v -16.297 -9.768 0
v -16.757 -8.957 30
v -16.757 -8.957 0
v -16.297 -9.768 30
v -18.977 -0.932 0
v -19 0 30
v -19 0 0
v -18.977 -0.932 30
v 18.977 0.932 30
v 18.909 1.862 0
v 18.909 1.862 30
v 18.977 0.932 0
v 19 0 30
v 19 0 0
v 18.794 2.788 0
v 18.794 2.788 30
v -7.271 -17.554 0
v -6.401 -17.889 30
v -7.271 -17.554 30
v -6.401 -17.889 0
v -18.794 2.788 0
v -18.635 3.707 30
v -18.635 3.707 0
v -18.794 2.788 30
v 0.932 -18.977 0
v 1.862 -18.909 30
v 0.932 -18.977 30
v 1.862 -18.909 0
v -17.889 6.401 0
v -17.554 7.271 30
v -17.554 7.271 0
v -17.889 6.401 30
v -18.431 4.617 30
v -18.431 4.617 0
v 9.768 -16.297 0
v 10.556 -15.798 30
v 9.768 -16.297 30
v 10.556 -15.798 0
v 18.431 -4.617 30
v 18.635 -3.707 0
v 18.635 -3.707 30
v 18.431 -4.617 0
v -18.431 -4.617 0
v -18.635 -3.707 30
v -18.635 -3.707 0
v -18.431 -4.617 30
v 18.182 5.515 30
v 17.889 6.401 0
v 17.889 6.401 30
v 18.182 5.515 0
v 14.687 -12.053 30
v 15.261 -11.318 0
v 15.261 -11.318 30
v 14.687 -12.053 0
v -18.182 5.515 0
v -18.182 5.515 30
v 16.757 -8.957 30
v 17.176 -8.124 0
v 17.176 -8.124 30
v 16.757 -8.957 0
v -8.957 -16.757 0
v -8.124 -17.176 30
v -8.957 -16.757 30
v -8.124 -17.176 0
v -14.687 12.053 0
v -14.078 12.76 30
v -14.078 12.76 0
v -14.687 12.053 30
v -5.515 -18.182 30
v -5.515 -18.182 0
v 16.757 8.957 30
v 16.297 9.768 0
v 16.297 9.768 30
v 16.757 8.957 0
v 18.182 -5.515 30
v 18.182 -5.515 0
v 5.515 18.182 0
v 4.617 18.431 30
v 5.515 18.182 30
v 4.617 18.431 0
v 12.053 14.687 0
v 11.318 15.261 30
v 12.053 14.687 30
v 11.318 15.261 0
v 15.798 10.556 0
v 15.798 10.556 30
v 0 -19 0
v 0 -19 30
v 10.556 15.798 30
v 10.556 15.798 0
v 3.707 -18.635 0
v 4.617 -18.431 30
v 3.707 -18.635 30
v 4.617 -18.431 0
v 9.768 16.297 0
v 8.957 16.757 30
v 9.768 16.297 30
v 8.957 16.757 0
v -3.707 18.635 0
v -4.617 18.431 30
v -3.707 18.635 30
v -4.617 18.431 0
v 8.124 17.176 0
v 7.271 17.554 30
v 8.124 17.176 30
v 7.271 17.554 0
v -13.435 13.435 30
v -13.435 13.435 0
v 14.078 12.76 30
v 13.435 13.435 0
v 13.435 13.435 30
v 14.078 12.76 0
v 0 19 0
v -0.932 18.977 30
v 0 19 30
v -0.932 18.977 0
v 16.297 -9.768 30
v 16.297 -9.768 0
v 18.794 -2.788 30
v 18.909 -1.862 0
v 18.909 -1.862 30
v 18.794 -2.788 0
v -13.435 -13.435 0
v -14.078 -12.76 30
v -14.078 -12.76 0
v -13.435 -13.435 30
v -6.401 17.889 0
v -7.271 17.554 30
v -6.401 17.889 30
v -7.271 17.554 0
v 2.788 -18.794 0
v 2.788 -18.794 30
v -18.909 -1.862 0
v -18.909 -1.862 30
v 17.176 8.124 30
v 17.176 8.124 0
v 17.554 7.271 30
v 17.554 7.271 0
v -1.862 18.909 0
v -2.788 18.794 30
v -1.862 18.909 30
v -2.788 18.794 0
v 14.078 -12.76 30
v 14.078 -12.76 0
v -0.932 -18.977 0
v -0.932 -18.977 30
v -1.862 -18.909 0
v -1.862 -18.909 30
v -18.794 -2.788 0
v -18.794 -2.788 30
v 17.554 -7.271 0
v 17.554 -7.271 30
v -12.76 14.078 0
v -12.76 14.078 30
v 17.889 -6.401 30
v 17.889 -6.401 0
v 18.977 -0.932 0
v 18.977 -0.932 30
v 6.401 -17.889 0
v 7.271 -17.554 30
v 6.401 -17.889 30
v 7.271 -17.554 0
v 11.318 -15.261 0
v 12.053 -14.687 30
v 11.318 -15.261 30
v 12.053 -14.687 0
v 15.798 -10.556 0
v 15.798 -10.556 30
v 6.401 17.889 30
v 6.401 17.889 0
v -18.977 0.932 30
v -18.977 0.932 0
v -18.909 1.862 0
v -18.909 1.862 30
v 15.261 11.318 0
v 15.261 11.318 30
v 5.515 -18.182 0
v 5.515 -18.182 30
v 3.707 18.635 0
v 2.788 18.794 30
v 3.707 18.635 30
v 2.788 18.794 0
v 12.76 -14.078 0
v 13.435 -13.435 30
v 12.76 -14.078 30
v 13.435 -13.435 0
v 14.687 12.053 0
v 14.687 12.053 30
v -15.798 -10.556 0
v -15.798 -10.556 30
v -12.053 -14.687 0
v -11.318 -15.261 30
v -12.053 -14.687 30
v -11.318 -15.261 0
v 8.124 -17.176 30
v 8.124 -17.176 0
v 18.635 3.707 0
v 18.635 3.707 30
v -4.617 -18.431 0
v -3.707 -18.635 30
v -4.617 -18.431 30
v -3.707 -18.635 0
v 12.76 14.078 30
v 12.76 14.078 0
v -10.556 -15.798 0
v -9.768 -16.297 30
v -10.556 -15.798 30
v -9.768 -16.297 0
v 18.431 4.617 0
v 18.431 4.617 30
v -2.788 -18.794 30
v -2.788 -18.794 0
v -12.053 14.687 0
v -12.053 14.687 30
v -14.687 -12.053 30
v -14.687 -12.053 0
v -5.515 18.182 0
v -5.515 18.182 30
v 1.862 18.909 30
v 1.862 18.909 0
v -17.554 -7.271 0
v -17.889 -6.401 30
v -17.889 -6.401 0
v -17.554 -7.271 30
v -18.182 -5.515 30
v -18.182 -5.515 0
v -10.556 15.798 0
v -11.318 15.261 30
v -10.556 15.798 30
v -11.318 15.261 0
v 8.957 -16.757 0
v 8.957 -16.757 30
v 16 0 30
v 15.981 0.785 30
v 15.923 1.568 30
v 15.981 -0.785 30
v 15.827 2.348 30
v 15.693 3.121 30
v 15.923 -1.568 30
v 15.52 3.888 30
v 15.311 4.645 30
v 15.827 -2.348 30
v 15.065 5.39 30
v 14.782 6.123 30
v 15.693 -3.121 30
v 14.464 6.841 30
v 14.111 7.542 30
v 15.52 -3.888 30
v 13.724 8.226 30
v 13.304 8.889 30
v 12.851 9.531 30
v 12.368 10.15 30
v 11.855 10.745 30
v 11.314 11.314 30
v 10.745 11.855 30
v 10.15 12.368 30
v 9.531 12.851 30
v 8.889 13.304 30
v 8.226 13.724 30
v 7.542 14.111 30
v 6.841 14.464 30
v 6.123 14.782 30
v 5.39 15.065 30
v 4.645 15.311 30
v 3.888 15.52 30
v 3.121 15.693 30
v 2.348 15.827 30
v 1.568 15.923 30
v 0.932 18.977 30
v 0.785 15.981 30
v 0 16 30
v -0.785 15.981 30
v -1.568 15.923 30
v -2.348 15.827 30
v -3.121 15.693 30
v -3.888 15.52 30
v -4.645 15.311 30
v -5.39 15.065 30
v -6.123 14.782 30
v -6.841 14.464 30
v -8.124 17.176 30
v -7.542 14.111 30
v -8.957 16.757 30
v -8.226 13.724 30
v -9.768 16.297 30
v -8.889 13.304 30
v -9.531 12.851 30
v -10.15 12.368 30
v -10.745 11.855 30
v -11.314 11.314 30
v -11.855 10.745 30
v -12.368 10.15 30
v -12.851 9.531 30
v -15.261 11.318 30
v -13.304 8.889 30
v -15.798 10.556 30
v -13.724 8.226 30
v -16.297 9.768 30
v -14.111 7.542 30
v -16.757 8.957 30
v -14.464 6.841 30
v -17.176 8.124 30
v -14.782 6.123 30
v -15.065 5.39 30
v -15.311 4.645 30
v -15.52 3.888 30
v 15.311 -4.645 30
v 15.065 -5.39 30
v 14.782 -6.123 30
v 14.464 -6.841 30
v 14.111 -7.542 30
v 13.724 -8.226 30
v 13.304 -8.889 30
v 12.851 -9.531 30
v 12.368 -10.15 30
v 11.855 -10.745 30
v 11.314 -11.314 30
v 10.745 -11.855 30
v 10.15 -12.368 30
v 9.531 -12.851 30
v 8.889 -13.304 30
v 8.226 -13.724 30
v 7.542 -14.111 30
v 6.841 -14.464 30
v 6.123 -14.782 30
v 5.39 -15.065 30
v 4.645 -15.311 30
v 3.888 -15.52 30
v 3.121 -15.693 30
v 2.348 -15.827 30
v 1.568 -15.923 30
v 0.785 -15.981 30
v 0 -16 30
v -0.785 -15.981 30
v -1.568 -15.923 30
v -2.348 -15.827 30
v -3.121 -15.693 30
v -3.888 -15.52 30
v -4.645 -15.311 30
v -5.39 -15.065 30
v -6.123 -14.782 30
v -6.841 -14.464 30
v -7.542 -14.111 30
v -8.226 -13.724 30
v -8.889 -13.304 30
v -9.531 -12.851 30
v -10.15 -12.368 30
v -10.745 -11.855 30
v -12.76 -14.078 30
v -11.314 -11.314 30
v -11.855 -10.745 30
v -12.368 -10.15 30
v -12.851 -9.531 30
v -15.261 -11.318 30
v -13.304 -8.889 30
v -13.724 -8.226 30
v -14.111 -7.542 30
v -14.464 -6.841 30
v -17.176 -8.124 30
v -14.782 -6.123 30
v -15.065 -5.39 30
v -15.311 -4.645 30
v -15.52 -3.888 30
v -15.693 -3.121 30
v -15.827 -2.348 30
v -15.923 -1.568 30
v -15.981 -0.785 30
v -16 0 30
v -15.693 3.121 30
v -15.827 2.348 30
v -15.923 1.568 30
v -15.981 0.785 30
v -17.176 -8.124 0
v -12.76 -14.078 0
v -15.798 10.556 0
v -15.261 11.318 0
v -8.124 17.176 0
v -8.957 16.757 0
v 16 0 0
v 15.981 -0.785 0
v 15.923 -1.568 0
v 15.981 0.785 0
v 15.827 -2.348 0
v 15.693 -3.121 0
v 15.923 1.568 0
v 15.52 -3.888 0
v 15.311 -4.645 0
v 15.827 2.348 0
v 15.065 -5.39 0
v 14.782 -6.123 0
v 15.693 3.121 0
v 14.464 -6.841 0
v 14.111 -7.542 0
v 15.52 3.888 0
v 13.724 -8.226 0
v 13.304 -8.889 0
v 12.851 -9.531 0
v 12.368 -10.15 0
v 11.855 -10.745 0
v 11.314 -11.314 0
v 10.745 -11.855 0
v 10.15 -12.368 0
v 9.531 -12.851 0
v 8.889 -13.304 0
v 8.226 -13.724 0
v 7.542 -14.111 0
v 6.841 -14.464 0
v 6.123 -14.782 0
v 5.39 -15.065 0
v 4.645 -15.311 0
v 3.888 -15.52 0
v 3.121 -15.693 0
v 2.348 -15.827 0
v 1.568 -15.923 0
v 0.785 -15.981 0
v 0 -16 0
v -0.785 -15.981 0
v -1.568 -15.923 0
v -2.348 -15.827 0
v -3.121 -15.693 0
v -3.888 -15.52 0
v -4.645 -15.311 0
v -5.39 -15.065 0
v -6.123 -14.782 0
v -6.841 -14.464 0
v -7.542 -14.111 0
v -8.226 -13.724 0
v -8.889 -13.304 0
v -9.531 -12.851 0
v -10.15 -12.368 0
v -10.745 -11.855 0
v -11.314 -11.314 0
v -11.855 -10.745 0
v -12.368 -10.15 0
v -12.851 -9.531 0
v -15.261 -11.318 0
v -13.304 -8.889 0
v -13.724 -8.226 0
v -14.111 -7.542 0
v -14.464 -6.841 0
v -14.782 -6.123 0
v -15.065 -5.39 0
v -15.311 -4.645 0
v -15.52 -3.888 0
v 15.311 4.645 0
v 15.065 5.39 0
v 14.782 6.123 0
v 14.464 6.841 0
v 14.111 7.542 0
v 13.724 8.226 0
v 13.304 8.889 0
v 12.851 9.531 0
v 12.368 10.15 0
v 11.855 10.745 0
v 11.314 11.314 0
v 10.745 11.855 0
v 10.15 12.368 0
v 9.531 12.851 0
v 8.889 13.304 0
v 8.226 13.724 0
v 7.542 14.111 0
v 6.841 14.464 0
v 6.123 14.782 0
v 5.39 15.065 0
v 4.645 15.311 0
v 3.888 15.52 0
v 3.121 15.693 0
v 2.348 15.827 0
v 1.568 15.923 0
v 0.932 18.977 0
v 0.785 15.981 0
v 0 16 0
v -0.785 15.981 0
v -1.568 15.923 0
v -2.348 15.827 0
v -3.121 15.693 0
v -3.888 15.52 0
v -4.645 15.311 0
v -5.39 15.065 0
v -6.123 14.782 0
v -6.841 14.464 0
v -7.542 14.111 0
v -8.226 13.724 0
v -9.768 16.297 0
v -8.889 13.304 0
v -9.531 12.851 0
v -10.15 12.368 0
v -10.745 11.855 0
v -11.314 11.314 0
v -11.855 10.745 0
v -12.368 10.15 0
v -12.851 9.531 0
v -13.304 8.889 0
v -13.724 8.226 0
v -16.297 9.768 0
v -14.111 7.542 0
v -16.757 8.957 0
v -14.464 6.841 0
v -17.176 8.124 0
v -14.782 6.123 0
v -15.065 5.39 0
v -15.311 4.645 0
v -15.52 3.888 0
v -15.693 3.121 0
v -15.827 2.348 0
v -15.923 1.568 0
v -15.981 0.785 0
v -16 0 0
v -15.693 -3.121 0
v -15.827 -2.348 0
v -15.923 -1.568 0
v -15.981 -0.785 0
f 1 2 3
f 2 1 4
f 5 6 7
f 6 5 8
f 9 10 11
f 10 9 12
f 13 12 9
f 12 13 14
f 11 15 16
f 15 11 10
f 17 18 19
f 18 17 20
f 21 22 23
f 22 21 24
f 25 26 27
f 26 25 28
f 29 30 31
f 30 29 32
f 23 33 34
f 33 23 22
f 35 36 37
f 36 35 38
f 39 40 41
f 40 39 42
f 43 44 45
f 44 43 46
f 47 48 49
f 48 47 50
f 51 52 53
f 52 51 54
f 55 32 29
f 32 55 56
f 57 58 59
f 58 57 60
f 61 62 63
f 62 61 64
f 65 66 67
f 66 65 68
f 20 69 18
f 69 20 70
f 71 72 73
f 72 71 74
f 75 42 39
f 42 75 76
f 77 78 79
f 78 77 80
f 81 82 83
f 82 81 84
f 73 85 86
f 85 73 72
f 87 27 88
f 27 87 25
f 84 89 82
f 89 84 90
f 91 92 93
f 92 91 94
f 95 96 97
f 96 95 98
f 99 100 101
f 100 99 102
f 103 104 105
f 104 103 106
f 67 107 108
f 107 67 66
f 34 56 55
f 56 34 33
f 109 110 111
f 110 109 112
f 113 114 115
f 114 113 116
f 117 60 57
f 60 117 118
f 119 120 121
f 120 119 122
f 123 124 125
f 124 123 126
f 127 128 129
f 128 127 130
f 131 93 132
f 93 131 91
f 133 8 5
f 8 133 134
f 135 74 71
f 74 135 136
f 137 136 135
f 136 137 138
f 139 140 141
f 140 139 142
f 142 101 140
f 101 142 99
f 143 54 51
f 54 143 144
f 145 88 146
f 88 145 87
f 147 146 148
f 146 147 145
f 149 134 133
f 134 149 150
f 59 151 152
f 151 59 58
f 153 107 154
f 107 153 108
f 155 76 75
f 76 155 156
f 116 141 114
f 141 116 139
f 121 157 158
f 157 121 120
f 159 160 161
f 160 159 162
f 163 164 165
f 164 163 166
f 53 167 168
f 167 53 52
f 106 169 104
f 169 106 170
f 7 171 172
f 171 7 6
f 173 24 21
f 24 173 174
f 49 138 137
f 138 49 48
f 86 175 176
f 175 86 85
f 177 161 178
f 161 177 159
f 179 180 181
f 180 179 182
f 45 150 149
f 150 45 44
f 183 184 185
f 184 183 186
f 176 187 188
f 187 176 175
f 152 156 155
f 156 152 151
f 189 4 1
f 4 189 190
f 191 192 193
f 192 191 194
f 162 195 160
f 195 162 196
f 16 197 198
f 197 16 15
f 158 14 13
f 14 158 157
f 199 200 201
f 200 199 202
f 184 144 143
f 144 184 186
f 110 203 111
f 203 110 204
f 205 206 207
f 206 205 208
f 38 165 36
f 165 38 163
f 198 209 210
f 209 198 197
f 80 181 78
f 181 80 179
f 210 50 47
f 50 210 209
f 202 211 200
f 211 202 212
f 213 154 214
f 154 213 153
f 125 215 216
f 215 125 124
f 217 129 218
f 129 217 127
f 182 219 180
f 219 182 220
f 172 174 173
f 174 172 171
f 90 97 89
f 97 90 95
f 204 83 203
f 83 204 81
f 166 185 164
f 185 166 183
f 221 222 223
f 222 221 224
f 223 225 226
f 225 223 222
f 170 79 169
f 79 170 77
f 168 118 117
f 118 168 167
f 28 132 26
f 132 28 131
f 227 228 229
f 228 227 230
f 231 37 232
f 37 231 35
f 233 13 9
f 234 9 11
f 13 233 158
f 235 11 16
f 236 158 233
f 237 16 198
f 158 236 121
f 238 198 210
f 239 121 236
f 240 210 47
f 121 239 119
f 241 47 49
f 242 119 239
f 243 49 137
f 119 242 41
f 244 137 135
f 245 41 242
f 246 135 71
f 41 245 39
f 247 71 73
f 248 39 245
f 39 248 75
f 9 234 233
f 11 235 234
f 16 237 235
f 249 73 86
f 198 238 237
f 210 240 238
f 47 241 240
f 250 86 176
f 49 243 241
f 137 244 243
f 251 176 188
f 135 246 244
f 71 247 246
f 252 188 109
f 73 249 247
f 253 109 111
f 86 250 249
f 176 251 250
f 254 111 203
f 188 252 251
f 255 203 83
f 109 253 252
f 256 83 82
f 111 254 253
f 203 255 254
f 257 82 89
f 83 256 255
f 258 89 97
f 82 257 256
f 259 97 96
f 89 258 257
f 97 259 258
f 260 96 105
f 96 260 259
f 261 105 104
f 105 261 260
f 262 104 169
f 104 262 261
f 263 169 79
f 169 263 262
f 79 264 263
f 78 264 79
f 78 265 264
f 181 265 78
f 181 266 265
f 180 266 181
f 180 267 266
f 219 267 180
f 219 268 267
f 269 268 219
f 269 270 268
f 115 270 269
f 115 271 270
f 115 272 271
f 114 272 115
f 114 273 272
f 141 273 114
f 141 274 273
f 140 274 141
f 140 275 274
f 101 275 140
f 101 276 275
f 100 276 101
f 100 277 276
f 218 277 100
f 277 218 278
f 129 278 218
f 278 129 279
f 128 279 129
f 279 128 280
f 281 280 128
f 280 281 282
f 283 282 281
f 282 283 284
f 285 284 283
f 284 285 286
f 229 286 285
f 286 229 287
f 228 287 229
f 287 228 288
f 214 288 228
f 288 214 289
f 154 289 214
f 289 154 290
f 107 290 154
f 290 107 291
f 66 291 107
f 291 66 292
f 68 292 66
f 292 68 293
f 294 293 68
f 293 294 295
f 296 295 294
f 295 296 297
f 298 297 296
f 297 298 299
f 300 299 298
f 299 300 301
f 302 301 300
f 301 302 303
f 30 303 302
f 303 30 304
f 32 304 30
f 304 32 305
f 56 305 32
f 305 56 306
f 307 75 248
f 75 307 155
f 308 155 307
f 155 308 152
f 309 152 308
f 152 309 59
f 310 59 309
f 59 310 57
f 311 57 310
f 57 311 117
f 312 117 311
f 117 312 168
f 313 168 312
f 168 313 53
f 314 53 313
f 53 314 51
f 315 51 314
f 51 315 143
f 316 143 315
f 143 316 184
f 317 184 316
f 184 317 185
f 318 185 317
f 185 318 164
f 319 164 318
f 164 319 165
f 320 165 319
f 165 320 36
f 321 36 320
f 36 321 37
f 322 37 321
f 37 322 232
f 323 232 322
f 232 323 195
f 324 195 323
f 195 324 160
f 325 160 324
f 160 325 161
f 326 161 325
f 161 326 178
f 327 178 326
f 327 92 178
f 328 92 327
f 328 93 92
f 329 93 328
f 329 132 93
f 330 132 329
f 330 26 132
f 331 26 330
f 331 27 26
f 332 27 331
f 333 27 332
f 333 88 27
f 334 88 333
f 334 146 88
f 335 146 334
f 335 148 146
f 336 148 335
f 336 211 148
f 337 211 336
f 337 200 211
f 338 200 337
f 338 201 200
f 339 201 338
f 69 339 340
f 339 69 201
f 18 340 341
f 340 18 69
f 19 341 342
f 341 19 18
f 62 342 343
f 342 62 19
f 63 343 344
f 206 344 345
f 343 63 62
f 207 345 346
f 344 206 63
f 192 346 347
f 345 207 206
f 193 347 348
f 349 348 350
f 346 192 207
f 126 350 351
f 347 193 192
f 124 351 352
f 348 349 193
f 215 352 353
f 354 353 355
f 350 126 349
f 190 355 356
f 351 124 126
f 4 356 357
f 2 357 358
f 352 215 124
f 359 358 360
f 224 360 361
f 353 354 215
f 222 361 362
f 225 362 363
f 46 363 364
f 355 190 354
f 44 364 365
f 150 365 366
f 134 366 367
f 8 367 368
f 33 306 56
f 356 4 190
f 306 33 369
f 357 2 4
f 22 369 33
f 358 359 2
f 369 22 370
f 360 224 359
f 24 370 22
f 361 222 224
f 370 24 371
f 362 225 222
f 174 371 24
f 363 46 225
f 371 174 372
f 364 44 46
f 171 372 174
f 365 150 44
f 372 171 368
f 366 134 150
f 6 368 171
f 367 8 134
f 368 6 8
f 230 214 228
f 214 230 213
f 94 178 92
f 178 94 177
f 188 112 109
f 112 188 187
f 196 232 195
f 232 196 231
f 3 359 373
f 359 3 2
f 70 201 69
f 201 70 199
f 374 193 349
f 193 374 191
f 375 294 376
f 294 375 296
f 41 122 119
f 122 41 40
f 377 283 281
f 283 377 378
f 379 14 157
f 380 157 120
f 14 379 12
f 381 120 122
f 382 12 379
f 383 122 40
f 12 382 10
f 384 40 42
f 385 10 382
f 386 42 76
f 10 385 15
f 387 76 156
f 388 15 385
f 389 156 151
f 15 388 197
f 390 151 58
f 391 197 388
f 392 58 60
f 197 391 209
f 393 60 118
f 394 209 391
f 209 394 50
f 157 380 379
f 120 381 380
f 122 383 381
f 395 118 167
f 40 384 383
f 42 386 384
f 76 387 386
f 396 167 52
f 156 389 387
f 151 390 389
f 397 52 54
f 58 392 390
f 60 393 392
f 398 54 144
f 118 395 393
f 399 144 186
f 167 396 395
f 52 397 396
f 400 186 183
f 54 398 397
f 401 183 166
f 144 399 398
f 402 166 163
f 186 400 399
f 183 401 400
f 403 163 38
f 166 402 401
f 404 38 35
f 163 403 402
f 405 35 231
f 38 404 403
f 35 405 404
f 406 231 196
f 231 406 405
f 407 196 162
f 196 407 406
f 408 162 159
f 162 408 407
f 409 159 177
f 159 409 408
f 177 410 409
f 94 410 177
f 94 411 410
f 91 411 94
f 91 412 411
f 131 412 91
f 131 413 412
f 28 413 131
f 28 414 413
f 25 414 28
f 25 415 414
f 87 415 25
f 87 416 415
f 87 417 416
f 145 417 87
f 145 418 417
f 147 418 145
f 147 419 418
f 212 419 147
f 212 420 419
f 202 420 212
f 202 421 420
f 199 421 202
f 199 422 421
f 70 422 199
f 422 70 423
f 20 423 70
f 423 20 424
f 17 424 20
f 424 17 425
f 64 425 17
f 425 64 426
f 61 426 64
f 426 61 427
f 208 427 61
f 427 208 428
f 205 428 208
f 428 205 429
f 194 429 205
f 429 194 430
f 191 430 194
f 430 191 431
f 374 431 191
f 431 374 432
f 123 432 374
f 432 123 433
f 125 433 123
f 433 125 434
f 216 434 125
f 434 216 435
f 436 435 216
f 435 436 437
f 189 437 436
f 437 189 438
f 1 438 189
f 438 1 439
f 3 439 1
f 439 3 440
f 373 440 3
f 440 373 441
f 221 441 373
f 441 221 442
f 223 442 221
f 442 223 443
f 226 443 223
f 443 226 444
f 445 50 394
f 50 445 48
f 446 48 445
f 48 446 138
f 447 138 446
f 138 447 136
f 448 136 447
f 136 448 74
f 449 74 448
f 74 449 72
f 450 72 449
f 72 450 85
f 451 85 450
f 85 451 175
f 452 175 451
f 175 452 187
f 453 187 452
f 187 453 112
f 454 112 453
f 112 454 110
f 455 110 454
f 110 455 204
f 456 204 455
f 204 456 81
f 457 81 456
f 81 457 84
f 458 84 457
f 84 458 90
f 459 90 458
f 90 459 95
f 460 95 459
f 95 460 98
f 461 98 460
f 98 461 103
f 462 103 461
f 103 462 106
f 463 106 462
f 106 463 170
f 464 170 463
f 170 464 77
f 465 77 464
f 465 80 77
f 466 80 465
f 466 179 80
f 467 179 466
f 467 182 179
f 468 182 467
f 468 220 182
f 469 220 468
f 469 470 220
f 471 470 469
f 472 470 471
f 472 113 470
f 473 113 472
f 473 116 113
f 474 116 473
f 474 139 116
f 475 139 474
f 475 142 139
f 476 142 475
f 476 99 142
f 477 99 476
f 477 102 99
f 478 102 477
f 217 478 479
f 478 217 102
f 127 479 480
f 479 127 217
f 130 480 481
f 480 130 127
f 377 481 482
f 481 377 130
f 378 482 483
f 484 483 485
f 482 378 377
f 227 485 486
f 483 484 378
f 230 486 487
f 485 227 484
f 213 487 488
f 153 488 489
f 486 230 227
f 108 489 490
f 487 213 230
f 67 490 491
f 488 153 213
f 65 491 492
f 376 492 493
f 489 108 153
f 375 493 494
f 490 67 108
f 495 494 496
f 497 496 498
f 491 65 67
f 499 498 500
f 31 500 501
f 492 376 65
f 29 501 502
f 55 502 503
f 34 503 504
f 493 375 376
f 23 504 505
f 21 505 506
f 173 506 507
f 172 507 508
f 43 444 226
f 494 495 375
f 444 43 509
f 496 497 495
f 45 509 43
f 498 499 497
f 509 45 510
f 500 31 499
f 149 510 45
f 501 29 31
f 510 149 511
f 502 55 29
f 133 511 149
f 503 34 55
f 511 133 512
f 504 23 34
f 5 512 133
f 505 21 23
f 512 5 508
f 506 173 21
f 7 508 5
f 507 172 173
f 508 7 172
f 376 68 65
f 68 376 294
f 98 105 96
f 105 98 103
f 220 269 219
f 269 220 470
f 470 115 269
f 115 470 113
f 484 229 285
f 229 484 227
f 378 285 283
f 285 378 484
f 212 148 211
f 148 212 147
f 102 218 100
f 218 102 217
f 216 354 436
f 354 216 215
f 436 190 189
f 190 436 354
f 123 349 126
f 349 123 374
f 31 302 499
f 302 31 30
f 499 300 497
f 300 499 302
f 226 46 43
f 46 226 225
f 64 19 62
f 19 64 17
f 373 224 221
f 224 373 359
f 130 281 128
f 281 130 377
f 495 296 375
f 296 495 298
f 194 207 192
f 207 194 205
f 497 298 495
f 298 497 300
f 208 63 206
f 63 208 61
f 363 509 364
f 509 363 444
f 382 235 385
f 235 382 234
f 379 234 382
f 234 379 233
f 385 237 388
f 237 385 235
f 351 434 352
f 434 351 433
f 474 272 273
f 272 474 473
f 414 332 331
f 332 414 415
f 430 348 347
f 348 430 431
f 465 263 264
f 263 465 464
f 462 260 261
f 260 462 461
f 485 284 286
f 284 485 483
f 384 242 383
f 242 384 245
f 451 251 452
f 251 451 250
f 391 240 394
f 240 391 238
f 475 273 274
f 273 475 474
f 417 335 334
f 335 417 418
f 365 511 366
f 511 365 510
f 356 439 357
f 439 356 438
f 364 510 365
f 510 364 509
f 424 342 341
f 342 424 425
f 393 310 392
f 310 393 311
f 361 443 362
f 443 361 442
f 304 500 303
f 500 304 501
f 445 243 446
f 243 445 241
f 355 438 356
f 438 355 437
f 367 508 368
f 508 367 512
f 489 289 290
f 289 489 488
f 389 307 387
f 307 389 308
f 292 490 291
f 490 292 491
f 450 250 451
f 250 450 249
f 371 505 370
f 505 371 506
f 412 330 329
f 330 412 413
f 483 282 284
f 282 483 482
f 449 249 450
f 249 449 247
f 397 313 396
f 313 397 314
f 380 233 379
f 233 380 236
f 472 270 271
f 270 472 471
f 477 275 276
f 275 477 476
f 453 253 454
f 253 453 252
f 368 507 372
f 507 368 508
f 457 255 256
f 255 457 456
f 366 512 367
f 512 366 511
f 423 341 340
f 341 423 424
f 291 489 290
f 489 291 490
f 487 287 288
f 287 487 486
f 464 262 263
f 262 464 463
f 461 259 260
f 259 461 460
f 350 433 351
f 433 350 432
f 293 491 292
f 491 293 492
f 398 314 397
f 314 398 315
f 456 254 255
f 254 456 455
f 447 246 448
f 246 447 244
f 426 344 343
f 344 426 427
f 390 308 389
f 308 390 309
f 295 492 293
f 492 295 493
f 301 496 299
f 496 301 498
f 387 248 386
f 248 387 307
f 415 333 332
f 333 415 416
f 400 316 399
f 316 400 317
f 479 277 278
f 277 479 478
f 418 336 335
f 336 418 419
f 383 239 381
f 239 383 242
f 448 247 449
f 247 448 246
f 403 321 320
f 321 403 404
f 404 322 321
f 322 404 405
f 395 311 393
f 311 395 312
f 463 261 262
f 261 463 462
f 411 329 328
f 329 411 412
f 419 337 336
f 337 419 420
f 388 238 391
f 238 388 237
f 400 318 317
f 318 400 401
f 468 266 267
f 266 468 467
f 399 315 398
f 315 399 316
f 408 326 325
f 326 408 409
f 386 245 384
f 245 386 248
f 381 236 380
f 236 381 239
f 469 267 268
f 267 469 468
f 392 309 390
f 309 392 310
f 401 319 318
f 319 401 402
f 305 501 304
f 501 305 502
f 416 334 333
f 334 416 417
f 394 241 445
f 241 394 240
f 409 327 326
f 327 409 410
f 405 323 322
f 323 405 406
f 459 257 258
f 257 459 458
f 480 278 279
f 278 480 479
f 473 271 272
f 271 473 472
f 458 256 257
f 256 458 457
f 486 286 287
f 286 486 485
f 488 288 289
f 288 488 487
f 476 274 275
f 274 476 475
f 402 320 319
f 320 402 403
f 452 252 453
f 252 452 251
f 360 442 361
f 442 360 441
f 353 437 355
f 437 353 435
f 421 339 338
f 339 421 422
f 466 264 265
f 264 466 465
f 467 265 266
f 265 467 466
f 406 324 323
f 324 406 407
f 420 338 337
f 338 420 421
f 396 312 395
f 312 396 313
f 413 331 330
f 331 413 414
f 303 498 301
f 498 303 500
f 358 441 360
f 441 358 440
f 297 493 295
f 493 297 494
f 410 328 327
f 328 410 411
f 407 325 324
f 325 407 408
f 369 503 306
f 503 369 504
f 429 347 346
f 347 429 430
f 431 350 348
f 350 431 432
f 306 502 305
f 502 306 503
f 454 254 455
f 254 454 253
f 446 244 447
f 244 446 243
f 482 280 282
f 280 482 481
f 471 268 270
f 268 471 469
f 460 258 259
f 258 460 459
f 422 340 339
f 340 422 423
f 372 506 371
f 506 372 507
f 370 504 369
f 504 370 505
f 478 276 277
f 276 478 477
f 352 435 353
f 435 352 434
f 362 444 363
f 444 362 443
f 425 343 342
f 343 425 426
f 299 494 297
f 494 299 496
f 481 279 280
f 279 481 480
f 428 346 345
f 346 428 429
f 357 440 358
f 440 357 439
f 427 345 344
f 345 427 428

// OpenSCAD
difference() {
  // end
cylinder(h=30.0, r=19.0, center=false, $fn=128);
  translate([0.0, 0.0, -1.0]) {
  // end bore
cylinder(h=32.0, r=16.0, center=false, $fn=128);
}
}
